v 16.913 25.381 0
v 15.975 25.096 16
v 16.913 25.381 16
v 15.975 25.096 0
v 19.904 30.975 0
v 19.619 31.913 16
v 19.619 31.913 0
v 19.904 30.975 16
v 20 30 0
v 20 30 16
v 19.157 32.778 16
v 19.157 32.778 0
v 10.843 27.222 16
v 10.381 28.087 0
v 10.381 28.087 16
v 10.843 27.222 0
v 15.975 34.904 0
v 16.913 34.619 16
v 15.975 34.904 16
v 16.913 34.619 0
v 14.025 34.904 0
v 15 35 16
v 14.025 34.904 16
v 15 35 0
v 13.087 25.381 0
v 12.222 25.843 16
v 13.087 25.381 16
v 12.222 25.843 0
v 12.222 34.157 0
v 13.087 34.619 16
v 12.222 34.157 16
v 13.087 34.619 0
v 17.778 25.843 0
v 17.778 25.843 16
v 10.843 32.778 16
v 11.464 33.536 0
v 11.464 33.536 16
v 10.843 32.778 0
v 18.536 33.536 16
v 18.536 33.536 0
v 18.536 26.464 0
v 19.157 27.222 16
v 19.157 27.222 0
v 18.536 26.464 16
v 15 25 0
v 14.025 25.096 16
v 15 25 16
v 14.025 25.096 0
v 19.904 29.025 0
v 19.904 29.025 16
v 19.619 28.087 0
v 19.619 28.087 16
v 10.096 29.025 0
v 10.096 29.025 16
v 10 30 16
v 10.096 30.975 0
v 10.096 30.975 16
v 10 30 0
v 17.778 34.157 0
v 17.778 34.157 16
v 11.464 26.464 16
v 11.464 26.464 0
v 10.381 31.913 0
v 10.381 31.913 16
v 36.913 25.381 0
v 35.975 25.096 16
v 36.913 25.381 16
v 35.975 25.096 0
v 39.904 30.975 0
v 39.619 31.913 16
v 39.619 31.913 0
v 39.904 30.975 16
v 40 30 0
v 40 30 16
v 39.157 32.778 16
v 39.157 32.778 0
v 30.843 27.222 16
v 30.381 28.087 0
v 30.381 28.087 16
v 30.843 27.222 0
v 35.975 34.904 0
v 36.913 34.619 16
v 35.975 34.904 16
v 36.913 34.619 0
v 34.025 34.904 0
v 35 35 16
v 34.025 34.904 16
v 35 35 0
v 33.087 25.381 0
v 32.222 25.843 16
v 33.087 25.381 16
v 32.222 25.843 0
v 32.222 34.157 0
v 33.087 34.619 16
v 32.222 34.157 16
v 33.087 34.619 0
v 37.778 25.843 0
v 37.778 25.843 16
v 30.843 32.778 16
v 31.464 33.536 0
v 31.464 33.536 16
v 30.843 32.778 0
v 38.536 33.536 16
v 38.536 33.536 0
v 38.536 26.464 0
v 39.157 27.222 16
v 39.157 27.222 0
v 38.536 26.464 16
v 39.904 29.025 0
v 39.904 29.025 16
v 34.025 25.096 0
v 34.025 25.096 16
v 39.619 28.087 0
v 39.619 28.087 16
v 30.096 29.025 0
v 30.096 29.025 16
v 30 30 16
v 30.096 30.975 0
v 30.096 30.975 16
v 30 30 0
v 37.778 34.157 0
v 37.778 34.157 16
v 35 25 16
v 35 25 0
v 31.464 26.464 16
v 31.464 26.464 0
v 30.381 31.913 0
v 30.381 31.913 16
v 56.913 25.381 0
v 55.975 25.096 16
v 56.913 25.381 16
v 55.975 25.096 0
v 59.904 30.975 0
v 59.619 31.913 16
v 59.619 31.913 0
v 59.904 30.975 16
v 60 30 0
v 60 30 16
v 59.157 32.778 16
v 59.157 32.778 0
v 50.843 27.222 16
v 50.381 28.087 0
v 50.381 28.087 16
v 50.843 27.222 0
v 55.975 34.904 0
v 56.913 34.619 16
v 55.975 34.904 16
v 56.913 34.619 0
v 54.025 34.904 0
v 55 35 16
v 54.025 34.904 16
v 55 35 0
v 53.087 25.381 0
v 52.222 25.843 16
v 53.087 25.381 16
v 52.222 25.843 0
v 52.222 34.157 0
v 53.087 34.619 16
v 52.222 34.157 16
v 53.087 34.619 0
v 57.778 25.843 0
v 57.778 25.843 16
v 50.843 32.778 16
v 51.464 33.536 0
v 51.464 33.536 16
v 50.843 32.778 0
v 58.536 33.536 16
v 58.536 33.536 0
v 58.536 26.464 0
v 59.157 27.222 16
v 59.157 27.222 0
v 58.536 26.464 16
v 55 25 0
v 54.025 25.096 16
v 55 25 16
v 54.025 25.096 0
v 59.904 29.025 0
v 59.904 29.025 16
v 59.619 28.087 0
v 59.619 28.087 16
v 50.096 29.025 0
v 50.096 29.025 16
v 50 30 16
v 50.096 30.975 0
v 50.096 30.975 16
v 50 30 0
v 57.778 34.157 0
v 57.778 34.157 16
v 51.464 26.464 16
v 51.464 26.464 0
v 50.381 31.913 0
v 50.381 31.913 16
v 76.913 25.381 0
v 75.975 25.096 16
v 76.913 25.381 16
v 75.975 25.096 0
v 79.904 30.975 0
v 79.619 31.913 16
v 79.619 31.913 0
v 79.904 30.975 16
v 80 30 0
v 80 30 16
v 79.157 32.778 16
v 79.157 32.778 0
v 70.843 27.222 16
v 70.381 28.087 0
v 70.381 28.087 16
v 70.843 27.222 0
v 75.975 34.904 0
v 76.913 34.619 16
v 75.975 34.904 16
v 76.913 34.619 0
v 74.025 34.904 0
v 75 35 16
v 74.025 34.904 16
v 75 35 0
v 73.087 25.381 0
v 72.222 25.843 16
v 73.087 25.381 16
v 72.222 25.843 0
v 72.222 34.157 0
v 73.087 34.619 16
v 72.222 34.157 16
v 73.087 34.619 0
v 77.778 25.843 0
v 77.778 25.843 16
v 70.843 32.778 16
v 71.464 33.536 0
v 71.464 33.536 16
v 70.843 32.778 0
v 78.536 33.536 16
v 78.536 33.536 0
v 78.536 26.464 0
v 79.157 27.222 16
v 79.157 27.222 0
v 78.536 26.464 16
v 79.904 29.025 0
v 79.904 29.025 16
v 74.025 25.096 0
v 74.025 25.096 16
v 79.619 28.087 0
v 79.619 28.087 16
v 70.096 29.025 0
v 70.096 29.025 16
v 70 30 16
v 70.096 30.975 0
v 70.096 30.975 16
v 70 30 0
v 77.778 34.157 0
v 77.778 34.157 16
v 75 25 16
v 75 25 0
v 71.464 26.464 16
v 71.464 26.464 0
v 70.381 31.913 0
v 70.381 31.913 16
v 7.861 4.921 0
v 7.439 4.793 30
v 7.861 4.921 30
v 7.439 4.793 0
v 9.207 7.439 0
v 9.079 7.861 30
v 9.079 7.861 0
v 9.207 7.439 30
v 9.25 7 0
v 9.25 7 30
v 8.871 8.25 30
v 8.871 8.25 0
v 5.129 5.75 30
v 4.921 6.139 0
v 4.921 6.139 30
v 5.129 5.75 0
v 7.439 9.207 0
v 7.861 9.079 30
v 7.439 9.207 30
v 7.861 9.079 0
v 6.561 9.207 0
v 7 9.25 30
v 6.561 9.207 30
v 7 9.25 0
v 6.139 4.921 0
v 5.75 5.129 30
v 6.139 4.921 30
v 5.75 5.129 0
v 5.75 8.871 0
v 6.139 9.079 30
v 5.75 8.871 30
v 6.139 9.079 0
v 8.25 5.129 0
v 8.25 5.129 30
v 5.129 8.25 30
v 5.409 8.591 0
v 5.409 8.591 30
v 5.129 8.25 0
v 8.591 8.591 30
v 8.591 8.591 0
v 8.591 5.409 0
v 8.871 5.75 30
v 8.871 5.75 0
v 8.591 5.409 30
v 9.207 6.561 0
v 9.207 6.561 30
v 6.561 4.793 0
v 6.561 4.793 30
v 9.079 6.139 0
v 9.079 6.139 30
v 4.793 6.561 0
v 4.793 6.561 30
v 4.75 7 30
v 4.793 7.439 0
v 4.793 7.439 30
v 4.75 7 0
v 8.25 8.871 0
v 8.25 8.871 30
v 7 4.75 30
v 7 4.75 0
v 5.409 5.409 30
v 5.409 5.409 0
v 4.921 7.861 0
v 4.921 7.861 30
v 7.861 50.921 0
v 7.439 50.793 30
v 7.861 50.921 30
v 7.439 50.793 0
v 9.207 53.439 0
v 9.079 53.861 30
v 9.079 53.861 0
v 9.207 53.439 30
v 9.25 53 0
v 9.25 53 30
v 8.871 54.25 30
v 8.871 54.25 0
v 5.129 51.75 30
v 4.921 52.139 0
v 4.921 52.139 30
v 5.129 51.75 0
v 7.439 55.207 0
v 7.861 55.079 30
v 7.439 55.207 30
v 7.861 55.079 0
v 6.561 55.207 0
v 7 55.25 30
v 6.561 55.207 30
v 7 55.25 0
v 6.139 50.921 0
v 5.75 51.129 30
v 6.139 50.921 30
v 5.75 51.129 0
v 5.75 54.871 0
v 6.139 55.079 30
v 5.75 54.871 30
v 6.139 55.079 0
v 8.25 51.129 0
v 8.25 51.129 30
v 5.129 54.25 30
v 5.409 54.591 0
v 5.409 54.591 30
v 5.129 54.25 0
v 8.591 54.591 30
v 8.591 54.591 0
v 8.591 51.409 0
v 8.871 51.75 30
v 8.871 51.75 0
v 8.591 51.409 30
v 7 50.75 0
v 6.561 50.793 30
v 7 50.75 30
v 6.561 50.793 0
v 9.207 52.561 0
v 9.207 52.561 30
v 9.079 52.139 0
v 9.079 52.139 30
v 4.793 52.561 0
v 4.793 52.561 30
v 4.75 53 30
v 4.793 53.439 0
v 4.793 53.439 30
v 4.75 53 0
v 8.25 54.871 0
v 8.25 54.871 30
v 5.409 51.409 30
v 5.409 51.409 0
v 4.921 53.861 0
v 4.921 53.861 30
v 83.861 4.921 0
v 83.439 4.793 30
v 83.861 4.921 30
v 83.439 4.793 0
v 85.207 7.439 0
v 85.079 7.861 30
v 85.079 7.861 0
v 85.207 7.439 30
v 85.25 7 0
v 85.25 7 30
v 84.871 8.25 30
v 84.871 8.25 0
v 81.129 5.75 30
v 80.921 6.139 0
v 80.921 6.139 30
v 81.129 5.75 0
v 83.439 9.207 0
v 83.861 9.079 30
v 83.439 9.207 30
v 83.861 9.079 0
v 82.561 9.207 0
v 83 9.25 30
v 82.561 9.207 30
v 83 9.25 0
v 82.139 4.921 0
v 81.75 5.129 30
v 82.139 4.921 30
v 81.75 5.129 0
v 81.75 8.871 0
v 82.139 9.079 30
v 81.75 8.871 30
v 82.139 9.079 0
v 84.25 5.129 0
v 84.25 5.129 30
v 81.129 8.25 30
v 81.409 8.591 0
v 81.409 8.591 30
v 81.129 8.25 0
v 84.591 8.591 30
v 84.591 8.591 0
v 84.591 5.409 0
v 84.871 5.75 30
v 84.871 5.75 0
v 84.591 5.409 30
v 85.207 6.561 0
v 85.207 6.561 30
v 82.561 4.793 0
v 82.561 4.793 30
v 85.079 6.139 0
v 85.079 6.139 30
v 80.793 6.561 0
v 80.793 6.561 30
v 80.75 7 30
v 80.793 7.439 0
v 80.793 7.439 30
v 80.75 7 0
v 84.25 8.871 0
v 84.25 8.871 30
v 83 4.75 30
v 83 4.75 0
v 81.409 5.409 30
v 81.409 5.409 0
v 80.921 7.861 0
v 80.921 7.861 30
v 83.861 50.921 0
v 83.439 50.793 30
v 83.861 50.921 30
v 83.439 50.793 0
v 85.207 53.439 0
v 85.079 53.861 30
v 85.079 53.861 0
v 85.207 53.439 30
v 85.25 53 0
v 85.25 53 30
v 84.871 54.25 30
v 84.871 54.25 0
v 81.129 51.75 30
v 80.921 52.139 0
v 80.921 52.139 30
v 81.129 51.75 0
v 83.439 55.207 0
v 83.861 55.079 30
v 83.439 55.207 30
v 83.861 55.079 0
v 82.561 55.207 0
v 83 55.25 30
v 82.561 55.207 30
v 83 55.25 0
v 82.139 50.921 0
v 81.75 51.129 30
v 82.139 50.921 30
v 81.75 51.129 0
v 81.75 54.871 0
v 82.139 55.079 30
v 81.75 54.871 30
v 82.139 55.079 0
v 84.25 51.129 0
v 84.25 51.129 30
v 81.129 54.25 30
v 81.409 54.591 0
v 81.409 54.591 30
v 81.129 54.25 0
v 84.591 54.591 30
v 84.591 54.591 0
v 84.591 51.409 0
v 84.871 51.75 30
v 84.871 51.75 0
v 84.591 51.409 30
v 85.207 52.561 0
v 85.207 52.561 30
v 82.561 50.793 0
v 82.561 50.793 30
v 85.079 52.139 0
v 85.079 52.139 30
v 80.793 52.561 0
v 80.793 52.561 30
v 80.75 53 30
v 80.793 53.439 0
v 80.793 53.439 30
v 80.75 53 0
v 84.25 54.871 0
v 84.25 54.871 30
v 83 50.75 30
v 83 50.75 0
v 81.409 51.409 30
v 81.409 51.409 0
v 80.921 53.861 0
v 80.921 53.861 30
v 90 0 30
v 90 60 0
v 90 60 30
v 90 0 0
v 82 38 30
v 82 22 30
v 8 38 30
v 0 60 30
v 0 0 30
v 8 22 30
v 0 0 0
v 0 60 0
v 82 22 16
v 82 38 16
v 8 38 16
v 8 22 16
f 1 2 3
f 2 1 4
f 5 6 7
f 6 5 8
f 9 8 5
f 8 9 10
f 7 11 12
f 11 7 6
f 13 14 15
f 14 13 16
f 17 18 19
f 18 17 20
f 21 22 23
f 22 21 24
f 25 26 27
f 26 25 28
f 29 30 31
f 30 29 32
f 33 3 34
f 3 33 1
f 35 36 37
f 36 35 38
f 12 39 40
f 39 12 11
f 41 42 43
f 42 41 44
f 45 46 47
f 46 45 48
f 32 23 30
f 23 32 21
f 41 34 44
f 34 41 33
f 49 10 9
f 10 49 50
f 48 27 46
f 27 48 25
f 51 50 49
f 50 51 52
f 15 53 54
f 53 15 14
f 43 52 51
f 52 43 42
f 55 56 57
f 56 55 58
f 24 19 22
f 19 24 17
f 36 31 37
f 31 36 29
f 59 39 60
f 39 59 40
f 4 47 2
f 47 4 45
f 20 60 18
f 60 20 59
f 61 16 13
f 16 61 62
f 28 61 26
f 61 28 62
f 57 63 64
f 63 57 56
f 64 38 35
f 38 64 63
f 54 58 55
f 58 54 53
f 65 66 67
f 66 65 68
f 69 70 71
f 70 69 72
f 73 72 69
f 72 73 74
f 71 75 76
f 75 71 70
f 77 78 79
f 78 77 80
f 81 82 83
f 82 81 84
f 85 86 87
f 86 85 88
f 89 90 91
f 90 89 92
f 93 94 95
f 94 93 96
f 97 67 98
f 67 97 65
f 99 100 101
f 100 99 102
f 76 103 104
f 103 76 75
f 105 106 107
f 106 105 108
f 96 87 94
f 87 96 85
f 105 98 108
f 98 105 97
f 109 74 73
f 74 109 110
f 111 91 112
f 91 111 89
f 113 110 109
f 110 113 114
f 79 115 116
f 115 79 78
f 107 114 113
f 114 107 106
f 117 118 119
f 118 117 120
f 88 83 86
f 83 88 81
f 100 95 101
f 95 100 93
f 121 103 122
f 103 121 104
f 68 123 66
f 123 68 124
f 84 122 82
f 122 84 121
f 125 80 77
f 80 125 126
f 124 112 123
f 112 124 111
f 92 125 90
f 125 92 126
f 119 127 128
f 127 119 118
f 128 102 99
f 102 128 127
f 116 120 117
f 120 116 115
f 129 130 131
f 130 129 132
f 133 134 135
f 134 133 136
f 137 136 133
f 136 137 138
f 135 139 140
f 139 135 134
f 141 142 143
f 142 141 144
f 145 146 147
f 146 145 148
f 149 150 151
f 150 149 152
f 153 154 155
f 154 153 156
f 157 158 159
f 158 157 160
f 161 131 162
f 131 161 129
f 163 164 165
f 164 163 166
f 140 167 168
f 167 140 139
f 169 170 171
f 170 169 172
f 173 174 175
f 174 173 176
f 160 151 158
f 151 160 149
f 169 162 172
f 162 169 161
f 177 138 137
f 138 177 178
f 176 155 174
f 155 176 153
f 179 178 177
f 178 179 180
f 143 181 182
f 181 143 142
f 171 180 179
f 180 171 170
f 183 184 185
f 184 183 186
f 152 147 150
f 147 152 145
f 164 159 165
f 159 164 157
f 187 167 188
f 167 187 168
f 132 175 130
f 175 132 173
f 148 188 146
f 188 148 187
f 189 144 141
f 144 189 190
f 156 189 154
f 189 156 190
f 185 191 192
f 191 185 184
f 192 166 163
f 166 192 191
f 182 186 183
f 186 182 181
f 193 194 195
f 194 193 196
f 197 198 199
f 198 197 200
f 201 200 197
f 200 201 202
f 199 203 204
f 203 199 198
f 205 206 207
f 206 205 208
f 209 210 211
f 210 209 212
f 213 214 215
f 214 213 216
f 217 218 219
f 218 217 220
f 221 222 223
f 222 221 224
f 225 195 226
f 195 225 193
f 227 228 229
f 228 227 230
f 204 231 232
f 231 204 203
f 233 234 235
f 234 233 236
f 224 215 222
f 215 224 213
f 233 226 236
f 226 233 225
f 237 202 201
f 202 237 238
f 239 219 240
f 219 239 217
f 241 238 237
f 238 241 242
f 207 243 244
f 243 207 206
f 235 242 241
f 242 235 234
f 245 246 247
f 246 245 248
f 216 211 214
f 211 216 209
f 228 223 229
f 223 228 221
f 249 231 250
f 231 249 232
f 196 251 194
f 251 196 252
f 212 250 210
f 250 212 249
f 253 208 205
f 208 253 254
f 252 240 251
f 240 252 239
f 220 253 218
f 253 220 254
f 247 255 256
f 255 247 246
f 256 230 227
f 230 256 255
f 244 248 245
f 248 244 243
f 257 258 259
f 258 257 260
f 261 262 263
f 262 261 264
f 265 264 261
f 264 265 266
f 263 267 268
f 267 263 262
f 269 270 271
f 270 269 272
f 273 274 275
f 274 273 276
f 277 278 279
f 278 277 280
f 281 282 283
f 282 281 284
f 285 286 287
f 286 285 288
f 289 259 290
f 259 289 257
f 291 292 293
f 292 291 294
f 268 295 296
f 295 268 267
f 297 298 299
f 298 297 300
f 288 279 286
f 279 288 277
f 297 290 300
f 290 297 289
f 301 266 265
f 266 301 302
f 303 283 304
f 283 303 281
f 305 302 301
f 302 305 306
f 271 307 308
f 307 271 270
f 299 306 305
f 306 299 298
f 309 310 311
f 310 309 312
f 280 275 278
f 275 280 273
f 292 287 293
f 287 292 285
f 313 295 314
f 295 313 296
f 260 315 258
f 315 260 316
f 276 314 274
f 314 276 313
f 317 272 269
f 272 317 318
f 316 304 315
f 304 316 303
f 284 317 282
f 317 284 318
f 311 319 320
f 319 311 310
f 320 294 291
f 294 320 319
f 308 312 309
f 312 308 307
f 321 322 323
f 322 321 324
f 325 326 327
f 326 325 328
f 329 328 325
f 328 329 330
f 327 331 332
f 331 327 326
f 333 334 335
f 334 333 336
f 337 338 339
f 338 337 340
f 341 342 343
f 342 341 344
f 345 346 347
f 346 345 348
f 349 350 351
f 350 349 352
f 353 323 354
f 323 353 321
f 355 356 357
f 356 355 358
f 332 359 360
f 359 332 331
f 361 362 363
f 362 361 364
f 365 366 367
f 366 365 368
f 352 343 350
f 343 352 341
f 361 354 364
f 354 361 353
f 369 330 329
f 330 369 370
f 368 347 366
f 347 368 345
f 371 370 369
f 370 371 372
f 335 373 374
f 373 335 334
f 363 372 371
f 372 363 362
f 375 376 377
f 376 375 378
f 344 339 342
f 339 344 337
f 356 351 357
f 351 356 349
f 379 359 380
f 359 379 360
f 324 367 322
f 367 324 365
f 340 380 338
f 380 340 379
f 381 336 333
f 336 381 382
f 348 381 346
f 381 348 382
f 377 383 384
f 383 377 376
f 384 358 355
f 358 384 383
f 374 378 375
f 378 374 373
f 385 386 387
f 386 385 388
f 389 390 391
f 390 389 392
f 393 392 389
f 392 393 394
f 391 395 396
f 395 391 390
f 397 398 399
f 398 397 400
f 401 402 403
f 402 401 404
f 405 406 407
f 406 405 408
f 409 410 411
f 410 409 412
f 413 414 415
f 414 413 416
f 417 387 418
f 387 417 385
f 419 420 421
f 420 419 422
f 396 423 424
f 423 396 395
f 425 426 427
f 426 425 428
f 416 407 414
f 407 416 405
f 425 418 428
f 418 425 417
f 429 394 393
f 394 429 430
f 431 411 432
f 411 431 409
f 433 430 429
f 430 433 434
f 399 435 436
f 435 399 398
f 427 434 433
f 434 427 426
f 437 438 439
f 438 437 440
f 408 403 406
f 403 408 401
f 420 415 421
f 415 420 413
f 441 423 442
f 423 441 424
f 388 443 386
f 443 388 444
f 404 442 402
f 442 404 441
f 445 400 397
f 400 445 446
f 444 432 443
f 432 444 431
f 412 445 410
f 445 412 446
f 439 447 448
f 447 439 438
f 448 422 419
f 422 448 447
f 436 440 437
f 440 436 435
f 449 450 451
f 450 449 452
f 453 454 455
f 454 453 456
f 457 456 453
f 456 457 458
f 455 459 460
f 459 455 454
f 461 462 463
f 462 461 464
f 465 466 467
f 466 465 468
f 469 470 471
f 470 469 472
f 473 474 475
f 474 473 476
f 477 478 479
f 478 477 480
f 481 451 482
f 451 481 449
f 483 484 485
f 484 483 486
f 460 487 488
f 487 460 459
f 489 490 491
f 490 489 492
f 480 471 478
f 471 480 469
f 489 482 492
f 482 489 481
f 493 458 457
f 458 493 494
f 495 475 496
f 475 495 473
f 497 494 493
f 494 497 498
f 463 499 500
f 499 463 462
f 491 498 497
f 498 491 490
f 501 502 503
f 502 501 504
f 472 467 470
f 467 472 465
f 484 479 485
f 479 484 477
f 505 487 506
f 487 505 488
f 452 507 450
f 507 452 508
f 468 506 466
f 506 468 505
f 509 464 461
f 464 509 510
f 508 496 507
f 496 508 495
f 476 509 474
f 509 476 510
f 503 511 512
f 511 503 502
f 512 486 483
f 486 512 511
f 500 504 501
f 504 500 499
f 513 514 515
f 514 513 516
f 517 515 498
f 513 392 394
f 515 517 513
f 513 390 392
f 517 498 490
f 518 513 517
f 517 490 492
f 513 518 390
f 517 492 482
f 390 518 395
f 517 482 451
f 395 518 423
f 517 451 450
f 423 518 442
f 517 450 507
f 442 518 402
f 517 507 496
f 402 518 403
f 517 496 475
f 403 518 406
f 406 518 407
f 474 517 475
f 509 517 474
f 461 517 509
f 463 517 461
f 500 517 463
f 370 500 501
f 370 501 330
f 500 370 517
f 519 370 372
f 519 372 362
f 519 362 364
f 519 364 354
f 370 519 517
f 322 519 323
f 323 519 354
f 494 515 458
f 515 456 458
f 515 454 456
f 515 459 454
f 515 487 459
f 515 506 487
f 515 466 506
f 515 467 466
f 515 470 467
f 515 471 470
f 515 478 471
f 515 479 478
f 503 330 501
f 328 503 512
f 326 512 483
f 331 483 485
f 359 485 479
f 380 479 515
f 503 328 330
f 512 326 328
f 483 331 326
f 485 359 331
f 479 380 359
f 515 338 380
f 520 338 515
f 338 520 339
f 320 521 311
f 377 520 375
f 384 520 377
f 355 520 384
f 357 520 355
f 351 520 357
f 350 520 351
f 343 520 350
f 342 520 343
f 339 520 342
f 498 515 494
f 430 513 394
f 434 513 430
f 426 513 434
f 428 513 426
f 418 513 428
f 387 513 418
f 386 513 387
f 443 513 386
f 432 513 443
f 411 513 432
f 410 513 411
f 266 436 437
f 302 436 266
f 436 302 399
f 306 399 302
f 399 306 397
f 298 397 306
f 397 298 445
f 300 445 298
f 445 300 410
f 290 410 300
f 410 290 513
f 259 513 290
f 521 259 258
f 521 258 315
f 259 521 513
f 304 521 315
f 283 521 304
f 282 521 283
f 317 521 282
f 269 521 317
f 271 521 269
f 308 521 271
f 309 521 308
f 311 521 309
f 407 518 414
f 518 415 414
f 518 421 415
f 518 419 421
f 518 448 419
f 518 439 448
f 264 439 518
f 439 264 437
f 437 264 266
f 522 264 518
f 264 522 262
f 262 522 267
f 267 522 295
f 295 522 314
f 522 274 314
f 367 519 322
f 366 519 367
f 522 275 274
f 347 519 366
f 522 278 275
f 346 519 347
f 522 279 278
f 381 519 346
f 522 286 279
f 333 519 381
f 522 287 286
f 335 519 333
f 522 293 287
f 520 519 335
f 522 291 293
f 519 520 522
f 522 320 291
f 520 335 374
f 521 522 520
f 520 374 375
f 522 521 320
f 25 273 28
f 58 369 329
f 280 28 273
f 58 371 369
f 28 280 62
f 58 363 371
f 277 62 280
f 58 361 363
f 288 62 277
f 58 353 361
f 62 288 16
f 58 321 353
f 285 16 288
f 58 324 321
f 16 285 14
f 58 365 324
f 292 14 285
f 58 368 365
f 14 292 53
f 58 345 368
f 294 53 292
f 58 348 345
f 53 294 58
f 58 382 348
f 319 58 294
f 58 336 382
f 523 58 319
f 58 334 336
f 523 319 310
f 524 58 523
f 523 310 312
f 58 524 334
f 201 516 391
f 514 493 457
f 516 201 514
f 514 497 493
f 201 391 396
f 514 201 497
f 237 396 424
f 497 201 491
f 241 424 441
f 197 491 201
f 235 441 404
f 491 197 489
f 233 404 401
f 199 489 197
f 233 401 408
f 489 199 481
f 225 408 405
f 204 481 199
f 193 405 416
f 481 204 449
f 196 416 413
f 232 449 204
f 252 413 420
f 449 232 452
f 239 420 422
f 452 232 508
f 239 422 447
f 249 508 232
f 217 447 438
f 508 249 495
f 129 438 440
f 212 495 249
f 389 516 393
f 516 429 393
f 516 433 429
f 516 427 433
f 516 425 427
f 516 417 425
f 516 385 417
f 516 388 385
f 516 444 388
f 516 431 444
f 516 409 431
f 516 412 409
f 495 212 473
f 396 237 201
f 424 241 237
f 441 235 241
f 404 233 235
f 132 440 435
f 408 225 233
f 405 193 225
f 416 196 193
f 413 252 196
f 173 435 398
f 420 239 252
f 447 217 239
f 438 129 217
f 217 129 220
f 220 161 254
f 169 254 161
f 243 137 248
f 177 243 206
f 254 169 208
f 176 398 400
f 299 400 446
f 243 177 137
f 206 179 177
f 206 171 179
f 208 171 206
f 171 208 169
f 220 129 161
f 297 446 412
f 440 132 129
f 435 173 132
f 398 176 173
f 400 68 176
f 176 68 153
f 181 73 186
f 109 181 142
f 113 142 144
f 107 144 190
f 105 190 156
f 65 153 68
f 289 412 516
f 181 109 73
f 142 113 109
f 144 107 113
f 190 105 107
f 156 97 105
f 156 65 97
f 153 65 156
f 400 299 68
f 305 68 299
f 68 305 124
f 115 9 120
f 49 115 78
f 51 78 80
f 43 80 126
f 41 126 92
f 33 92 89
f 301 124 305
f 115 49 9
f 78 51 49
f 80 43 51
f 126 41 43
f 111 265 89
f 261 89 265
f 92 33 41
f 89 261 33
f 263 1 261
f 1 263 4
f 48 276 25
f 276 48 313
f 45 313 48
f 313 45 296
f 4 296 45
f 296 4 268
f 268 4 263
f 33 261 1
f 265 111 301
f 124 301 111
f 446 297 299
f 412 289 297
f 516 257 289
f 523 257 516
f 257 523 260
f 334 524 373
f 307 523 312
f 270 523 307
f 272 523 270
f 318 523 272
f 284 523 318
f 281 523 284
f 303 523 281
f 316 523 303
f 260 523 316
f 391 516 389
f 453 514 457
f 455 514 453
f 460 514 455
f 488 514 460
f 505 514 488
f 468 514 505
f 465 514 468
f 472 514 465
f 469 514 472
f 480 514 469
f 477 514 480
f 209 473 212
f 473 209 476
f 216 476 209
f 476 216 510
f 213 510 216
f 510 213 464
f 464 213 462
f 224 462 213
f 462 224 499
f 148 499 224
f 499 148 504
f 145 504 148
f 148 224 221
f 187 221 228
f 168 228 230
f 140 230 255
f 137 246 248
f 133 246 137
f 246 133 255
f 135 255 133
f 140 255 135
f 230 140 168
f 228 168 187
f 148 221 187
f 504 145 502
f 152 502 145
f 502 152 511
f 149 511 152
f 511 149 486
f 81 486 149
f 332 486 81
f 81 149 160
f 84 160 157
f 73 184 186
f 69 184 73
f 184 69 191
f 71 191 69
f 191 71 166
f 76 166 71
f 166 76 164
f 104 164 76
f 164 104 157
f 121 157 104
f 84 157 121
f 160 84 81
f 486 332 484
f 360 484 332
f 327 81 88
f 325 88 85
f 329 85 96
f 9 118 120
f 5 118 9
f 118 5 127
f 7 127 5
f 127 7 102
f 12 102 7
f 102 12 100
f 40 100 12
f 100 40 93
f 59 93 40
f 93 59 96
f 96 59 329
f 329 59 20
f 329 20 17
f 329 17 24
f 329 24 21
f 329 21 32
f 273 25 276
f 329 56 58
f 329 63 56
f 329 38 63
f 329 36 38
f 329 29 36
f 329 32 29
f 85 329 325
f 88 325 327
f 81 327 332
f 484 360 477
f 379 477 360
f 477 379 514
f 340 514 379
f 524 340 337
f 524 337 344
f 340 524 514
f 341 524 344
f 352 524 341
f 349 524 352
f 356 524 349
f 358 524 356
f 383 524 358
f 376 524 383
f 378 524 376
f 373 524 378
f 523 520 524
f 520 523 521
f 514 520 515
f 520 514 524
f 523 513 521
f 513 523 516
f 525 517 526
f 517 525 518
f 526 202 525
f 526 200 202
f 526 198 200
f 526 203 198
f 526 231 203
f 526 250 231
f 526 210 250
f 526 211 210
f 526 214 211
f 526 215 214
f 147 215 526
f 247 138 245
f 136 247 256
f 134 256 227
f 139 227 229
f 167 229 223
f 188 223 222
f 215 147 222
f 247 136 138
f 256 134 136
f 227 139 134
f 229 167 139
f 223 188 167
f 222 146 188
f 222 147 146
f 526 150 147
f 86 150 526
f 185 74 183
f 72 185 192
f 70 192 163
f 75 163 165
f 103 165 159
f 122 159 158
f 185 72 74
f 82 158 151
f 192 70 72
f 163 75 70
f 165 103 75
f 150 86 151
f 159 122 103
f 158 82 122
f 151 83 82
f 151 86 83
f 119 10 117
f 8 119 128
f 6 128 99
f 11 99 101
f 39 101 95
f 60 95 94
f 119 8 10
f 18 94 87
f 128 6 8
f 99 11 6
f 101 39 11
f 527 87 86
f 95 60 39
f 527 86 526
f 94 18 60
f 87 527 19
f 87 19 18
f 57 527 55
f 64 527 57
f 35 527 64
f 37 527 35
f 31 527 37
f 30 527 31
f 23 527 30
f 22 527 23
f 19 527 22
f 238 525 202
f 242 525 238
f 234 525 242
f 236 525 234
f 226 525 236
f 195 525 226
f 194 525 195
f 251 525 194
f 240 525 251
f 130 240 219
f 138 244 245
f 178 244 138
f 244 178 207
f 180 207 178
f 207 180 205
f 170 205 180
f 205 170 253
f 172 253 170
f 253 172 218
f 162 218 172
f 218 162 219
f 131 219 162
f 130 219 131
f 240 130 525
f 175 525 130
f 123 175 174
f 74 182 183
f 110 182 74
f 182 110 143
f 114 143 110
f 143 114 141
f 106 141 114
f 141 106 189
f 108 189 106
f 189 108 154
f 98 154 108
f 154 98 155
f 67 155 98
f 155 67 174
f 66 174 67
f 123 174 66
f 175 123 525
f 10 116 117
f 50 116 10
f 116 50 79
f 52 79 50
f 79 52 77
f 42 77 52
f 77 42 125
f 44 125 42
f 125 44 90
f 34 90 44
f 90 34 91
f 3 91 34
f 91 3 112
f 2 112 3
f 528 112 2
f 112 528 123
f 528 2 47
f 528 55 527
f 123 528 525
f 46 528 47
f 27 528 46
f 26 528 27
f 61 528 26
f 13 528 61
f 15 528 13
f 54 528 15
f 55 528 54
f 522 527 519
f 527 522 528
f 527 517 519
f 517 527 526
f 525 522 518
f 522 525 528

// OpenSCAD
$fn = 32;

// ----------------------------------------------------------------------
// Manifold block: gallery_top manifold
// ----------------------------------------------------------------------

// --- parameters (mm) ---
block_l = 90;             // block length, X
block_w = 60;             // block width, Y
block_h = 30;             // block height, Z
port_d = 10;              // port bore diameter
port_pitch = 20;          // port pitch along X
gallery_d = 16;           // top gallery width, Y
gallery_depth = 14;       // gallery pocket depth
wall_p = 8;               // gallery end wall thickness, X
mnt_d = 4.5;              // mounting hole diameter
mnt_in = 7;               // mounting hole inset from the edges

n_ports = 4;  // ports in the row
port_x0 = (block_l - (n_ports - 1) * port_pitch) / 2;  // first port X

difference() {
  cube([block_l, block_w, block_h]);
  for (i = [0 : n_ports - 1])
    translate([port_x0 + i * port_pitch, block_w / 2, -1])
      cylinder(h = block_h + 2, d = port_d);
  translate([wall_p, block_w / 2 - gallery_d / 2, block_h - gallery_depth])
    cube([block_l - 2 * wall_p, gallery_d, gallery_depth + 1]);
  for (cx = [mnt_in, block_l - mnt_in])
    for (cy = [mnt_in, block_w - mnt_in])
      translate([cx, cy, -1]) cylinder(h = block_h + 2, d = mnt_d);
}
